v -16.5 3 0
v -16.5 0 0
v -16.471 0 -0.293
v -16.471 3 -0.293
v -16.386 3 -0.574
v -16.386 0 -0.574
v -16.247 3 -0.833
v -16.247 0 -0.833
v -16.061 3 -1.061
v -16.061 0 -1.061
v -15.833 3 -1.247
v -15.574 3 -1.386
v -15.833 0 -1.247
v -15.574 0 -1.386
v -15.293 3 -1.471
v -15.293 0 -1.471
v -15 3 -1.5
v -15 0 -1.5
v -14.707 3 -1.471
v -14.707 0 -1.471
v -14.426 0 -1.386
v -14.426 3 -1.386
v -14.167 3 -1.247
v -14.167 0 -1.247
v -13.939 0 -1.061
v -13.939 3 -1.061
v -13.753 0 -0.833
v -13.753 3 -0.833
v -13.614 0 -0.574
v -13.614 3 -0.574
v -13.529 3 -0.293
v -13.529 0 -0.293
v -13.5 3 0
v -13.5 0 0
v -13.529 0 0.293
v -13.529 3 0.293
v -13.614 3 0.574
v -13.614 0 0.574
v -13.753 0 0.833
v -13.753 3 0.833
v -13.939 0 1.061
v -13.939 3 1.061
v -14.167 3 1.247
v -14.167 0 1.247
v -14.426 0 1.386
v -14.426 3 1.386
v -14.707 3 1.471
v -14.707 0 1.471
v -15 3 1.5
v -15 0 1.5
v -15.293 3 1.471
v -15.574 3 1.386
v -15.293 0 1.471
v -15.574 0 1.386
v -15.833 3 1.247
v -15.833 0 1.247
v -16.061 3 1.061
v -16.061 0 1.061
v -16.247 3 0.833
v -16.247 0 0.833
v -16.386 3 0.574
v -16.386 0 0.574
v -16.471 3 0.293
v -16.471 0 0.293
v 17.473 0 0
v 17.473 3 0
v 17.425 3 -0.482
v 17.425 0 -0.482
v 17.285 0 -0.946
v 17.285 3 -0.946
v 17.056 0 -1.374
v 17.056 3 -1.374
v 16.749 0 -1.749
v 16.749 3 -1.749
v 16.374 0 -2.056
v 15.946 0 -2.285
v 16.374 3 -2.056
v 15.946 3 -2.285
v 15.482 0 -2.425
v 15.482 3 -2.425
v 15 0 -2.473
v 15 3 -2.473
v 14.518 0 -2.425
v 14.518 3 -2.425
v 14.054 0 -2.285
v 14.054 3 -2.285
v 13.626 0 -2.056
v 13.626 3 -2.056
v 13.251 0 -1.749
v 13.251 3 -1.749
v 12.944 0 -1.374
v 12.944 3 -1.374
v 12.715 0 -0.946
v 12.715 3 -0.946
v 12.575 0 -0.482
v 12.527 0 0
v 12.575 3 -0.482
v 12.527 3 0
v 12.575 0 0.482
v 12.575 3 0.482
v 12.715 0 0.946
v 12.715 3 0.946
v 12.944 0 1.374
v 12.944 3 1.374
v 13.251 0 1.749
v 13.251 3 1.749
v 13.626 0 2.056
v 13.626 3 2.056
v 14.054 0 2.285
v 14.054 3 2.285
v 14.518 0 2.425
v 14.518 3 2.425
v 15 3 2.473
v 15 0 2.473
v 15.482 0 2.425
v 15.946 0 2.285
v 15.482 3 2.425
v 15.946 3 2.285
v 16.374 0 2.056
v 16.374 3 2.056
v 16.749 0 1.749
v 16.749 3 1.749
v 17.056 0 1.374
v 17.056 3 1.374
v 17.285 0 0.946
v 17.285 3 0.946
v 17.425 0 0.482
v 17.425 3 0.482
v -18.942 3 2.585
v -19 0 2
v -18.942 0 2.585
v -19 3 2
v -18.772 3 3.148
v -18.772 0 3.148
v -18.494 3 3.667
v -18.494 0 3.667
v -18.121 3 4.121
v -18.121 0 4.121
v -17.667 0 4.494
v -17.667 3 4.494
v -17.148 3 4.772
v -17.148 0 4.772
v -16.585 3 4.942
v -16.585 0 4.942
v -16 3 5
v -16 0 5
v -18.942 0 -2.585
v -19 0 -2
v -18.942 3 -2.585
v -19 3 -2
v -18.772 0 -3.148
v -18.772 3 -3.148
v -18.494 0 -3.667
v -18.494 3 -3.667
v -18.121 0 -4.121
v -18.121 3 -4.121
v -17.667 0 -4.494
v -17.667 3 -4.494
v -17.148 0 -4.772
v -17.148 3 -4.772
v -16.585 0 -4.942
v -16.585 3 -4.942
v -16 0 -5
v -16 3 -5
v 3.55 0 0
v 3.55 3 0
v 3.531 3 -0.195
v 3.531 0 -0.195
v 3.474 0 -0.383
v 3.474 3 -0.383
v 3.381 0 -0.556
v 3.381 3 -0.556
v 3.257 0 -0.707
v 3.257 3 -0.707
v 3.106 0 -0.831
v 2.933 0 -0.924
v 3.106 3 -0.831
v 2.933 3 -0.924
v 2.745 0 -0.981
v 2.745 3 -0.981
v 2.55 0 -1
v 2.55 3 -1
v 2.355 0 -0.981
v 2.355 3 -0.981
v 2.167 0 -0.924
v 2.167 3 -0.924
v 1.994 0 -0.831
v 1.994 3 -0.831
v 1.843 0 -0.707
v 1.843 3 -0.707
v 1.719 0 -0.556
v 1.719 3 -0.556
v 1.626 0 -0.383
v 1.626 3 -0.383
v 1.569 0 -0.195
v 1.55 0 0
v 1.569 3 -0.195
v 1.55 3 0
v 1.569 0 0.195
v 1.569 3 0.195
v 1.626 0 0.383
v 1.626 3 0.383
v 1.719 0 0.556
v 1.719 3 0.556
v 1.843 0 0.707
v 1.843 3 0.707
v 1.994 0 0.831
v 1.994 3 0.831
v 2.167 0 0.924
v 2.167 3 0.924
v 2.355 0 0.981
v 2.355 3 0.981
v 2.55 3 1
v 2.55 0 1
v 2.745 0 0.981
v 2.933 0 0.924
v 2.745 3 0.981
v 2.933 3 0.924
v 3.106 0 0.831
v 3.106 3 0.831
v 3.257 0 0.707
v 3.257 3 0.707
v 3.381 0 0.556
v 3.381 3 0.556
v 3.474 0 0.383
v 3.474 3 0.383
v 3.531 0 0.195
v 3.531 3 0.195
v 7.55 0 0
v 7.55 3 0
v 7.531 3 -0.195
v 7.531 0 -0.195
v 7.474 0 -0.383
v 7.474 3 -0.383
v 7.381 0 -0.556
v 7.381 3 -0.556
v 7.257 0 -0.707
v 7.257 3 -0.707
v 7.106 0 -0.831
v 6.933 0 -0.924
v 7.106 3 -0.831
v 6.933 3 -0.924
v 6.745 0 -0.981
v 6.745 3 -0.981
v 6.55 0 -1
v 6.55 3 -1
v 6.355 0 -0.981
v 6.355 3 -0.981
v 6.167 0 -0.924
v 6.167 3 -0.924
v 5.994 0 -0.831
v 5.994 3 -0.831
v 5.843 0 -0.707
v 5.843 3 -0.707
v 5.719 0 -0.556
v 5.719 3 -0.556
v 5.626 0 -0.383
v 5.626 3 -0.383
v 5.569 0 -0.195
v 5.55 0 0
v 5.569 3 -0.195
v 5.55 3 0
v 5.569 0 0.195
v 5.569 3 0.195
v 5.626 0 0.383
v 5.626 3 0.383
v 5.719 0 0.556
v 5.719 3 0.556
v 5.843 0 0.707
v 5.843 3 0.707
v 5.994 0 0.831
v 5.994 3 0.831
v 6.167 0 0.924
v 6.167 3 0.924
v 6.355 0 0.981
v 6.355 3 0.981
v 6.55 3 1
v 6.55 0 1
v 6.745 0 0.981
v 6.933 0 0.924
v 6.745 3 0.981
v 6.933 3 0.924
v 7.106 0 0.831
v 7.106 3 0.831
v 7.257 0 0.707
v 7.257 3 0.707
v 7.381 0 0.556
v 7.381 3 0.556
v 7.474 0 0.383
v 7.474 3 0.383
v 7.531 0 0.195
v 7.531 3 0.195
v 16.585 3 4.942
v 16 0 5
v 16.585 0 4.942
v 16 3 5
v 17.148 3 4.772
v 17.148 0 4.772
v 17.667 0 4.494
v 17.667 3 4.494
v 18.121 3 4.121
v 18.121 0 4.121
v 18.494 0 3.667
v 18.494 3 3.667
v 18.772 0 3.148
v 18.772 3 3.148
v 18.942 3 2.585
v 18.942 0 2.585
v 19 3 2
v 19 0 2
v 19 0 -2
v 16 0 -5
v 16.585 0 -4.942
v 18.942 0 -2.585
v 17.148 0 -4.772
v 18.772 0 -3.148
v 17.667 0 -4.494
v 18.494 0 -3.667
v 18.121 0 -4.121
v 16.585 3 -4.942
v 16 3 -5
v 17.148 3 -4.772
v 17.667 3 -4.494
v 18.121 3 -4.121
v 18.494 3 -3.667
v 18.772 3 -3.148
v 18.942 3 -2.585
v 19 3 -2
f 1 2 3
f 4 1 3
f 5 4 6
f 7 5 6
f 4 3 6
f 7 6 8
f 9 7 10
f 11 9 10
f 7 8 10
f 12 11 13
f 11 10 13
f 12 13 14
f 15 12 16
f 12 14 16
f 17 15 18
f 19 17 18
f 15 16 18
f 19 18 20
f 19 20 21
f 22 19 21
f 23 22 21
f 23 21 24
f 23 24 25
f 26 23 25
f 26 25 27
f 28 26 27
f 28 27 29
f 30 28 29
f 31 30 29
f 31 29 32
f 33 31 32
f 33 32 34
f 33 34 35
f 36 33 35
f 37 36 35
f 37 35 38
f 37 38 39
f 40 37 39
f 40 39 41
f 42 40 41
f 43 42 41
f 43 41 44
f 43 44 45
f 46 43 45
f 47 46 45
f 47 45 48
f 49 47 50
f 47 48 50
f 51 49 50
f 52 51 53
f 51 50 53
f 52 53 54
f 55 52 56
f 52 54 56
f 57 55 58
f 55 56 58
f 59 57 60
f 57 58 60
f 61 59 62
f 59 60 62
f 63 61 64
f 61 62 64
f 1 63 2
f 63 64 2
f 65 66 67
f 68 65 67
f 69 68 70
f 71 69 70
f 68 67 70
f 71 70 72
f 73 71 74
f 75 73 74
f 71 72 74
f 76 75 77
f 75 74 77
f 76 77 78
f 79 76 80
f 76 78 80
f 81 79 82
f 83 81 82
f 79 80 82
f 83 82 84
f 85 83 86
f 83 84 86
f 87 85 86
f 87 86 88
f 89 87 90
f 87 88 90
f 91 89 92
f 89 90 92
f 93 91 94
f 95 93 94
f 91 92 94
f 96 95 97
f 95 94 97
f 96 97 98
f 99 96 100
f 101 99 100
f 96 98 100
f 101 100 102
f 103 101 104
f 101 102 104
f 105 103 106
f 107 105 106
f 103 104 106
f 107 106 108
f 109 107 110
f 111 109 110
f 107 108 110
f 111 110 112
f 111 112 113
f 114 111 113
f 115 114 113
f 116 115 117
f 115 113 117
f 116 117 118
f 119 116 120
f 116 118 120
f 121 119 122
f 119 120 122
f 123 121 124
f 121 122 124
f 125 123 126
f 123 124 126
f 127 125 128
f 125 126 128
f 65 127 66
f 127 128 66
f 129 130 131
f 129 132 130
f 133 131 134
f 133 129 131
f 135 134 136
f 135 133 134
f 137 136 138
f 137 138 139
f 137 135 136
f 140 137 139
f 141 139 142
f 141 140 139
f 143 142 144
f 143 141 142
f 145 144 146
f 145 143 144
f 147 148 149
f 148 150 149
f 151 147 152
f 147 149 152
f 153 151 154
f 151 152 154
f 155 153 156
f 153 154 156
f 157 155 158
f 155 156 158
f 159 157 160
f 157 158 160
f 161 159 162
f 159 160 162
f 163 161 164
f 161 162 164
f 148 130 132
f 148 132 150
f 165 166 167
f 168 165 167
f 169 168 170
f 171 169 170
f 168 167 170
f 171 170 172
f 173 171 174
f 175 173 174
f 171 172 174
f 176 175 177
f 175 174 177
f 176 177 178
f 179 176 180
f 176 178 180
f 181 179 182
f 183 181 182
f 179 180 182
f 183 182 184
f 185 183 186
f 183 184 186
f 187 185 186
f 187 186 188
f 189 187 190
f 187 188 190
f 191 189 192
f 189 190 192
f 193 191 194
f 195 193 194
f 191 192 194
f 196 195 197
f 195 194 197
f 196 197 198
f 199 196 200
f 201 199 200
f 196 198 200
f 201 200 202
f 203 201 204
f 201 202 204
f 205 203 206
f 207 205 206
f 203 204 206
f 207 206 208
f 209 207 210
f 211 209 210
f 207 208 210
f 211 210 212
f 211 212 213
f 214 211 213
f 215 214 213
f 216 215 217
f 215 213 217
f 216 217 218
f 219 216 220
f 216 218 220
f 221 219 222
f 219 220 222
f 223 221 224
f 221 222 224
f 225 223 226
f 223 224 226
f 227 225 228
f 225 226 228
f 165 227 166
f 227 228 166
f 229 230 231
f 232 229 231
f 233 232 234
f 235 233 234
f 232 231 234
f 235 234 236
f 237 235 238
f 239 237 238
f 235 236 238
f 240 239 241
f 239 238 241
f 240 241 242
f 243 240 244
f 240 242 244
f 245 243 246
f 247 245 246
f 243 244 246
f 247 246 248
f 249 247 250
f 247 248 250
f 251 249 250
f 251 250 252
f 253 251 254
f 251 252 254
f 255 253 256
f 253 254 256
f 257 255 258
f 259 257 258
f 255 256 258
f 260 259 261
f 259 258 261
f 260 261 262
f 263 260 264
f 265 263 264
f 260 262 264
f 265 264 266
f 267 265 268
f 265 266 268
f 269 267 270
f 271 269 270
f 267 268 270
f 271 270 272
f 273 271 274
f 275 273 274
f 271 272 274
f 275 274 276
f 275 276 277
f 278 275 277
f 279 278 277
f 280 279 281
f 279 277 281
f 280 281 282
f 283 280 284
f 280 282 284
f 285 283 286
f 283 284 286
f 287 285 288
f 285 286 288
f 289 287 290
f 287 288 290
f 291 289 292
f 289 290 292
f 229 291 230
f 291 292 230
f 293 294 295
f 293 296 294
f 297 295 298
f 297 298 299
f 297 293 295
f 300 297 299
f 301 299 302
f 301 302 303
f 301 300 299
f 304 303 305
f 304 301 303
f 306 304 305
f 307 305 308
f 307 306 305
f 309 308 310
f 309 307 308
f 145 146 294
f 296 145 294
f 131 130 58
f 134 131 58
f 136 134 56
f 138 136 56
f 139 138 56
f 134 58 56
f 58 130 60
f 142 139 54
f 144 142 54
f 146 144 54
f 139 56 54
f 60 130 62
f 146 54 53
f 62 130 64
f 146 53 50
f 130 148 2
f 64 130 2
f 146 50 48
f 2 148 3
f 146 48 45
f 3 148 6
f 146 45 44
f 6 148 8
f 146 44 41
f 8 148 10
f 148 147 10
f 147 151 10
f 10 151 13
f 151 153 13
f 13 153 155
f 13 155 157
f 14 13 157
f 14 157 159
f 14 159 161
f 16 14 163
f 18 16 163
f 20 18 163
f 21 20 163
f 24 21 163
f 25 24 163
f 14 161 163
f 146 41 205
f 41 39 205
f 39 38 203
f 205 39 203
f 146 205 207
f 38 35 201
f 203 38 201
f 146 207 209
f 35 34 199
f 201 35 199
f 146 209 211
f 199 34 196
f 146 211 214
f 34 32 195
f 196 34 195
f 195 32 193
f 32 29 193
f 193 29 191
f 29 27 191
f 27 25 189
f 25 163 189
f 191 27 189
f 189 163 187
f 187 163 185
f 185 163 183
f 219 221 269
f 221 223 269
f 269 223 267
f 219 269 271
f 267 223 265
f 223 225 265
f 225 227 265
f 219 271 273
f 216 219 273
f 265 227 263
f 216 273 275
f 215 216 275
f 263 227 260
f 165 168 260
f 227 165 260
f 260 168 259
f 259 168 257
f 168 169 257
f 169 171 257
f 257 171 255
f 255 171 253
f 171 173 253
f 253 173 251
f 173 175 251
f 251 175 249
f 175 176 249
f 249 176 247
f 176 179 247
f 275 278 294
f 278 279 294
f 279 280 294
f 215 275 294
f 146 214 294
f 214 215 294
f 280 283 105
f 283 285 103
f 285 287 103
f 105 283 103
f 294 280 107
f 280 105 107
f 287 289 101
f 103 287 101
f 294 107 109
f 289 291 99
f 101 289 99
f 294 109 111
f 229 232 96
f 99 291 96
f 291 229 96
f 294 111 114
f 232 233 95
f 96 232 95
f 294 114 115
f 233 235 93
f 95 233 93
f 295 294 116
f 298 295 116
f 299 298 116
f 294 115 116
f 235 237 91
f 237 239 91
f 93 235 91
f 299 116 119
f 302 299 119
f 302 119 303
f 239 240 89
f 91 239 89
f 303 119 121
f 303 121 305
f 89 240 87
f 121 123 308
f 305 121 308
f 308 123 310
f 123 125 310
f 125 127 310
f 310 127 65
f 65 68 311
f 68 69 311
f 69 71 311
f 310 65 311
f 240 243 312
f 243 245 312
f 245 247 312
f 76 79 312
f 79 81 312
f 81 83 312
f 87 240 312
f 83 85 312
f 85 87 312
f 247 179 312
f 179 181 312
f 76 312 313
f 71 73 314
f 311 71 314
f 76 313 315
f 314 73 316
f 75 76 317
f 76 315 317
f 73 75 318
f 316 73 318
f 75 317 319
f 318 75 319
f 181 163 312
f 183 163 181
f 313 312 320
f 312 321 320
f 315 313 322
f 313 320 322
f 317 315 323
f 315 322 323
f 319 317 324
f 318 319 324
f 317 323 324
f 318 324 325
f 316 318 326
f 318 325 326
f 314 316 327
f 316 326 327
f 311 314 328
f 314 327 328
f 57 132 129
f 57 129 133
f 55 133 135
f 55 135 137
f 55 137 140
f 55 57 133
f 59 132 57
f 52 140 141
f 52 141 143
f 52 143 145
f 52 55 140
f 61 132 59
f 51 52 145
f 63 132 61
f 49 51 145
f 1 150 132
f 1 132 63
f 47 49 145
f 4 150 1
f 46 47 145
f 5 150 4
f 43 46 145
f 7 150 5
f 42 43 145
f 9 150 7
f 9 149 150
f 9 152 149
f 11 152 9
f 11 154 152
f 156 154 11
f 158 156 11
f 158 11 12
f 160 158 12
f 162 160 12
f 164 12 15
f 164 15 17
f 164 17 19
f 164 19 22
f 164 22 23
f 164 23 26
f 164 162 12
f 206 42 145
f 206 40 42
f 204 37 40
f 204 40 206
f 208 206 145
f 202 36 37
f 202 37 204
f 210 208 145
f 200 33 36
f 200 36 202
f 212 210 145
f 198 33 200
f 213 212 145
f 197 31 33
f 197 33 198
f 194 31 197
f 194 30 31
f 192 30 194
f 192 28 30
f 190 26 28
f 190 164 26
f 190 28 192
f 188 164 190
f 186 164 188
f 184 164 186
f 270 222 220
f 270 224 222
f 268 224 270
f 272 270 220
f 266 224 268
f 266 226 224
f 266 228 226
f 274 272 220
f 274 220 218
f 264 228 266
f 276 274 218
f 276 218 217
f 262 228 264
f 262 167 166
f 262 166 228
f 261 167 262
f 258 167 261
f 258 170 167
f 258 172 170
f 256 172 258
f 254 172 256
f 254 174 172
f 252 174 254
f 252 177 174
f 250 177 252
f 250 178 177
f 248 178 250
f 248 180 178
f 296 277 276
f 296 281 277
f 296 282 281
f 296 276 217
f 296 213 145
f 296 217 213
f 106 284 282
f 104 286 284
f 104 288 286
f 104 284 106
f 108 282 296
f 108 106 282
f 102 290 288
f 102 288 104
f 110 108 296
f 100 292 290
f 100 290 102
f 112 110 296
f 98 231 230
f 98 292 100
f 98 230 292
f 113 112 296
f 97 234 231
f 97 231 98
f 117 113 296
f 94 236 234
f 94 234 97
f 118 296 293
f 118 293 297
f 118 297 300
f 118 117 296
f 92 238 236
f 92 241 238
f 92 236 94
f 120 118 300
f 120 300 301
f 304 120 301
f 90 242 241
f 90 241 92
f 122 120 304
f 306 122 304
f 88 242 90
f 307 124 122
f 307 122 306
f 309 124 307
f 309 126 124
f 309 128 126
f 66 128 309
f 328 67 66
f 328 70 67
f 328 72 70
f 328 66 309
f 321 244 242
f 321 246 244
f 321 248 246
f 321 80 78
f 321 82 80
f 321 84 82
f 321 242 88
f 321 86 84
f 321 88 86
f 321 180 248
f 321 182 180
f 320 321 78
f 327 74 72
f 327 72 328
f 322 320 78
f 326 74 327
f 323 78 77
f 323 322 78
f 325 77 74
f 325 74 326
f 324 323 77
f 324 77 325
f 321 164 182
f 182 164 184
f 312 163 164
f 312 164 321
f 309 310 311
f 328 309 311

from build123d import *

# Parameters (mm, degrees)
SKETCH1_W                = 38
SKETCH1_H                = 10
BOSS_EXTRUDE1_DEPTH      = 3
SKETCH2_R                = 2.472864358
SKETCH2_R_2              = 1
CUT_EXTRUDE1_DEPTH       = 3
FILLET1_R                = 3
F_3_0_3_DIAMETER_HOLE1_D = 3


with BuildPart() as part:
    # Sketch1 → Boss-Extrude1 (new body)
    with BuildSketch(Plane(origin=(0, 0, 0), x_dir=(1, 0, 0), z_dir=(0, 1, 0))):
        Rectangle(SKETCH1_W, SKETCH1_H)
    extrude(amount=BOSS_EXTRUDE1_DEPTH)

    # Sketch2 → Cut-Extrude1 (cut)
    with BuildSketch(Plane(origin=(0, 3, 0), x_dir=(1, 0, 0), z_dir=(0, 1, 0))):
        with Locations((15, 0)):
            Circle(SKETCH2_R)
        with Locations((6.55, 0)):
            Circle(SKETCH2_R_2)
        with Locations((2.55, 0)):
            Circle(SKETCH2_R_2)
    extrude(amount=-CUT_EXTRUDE1_DEPTH, mode=Mode.SUBTRACT)

    # Fillet1
    fillet1_edges = [part.edges().sort_by_distance(p)[0] for p in [
        (19, 1.5, 5),
        (-19, 1.5, 5),
        (-19, 1.5, -5),
        (19, 1.5, -5),
    ]]
    fillet(fillet1_edges, radius=FILLET1_R)

    # Ø3.0 (3) Diameter Hole1 (through all)
    with Locations(Plane(origin=(0, 3, 0), x_dir=(1, 0, 0), z_dir=(0, 1, 0))):
        with Locations((-15, 0)):
            Hole(F_3_0_3_DIAMETER_HOLE1_D / 2)


solid = part.part
